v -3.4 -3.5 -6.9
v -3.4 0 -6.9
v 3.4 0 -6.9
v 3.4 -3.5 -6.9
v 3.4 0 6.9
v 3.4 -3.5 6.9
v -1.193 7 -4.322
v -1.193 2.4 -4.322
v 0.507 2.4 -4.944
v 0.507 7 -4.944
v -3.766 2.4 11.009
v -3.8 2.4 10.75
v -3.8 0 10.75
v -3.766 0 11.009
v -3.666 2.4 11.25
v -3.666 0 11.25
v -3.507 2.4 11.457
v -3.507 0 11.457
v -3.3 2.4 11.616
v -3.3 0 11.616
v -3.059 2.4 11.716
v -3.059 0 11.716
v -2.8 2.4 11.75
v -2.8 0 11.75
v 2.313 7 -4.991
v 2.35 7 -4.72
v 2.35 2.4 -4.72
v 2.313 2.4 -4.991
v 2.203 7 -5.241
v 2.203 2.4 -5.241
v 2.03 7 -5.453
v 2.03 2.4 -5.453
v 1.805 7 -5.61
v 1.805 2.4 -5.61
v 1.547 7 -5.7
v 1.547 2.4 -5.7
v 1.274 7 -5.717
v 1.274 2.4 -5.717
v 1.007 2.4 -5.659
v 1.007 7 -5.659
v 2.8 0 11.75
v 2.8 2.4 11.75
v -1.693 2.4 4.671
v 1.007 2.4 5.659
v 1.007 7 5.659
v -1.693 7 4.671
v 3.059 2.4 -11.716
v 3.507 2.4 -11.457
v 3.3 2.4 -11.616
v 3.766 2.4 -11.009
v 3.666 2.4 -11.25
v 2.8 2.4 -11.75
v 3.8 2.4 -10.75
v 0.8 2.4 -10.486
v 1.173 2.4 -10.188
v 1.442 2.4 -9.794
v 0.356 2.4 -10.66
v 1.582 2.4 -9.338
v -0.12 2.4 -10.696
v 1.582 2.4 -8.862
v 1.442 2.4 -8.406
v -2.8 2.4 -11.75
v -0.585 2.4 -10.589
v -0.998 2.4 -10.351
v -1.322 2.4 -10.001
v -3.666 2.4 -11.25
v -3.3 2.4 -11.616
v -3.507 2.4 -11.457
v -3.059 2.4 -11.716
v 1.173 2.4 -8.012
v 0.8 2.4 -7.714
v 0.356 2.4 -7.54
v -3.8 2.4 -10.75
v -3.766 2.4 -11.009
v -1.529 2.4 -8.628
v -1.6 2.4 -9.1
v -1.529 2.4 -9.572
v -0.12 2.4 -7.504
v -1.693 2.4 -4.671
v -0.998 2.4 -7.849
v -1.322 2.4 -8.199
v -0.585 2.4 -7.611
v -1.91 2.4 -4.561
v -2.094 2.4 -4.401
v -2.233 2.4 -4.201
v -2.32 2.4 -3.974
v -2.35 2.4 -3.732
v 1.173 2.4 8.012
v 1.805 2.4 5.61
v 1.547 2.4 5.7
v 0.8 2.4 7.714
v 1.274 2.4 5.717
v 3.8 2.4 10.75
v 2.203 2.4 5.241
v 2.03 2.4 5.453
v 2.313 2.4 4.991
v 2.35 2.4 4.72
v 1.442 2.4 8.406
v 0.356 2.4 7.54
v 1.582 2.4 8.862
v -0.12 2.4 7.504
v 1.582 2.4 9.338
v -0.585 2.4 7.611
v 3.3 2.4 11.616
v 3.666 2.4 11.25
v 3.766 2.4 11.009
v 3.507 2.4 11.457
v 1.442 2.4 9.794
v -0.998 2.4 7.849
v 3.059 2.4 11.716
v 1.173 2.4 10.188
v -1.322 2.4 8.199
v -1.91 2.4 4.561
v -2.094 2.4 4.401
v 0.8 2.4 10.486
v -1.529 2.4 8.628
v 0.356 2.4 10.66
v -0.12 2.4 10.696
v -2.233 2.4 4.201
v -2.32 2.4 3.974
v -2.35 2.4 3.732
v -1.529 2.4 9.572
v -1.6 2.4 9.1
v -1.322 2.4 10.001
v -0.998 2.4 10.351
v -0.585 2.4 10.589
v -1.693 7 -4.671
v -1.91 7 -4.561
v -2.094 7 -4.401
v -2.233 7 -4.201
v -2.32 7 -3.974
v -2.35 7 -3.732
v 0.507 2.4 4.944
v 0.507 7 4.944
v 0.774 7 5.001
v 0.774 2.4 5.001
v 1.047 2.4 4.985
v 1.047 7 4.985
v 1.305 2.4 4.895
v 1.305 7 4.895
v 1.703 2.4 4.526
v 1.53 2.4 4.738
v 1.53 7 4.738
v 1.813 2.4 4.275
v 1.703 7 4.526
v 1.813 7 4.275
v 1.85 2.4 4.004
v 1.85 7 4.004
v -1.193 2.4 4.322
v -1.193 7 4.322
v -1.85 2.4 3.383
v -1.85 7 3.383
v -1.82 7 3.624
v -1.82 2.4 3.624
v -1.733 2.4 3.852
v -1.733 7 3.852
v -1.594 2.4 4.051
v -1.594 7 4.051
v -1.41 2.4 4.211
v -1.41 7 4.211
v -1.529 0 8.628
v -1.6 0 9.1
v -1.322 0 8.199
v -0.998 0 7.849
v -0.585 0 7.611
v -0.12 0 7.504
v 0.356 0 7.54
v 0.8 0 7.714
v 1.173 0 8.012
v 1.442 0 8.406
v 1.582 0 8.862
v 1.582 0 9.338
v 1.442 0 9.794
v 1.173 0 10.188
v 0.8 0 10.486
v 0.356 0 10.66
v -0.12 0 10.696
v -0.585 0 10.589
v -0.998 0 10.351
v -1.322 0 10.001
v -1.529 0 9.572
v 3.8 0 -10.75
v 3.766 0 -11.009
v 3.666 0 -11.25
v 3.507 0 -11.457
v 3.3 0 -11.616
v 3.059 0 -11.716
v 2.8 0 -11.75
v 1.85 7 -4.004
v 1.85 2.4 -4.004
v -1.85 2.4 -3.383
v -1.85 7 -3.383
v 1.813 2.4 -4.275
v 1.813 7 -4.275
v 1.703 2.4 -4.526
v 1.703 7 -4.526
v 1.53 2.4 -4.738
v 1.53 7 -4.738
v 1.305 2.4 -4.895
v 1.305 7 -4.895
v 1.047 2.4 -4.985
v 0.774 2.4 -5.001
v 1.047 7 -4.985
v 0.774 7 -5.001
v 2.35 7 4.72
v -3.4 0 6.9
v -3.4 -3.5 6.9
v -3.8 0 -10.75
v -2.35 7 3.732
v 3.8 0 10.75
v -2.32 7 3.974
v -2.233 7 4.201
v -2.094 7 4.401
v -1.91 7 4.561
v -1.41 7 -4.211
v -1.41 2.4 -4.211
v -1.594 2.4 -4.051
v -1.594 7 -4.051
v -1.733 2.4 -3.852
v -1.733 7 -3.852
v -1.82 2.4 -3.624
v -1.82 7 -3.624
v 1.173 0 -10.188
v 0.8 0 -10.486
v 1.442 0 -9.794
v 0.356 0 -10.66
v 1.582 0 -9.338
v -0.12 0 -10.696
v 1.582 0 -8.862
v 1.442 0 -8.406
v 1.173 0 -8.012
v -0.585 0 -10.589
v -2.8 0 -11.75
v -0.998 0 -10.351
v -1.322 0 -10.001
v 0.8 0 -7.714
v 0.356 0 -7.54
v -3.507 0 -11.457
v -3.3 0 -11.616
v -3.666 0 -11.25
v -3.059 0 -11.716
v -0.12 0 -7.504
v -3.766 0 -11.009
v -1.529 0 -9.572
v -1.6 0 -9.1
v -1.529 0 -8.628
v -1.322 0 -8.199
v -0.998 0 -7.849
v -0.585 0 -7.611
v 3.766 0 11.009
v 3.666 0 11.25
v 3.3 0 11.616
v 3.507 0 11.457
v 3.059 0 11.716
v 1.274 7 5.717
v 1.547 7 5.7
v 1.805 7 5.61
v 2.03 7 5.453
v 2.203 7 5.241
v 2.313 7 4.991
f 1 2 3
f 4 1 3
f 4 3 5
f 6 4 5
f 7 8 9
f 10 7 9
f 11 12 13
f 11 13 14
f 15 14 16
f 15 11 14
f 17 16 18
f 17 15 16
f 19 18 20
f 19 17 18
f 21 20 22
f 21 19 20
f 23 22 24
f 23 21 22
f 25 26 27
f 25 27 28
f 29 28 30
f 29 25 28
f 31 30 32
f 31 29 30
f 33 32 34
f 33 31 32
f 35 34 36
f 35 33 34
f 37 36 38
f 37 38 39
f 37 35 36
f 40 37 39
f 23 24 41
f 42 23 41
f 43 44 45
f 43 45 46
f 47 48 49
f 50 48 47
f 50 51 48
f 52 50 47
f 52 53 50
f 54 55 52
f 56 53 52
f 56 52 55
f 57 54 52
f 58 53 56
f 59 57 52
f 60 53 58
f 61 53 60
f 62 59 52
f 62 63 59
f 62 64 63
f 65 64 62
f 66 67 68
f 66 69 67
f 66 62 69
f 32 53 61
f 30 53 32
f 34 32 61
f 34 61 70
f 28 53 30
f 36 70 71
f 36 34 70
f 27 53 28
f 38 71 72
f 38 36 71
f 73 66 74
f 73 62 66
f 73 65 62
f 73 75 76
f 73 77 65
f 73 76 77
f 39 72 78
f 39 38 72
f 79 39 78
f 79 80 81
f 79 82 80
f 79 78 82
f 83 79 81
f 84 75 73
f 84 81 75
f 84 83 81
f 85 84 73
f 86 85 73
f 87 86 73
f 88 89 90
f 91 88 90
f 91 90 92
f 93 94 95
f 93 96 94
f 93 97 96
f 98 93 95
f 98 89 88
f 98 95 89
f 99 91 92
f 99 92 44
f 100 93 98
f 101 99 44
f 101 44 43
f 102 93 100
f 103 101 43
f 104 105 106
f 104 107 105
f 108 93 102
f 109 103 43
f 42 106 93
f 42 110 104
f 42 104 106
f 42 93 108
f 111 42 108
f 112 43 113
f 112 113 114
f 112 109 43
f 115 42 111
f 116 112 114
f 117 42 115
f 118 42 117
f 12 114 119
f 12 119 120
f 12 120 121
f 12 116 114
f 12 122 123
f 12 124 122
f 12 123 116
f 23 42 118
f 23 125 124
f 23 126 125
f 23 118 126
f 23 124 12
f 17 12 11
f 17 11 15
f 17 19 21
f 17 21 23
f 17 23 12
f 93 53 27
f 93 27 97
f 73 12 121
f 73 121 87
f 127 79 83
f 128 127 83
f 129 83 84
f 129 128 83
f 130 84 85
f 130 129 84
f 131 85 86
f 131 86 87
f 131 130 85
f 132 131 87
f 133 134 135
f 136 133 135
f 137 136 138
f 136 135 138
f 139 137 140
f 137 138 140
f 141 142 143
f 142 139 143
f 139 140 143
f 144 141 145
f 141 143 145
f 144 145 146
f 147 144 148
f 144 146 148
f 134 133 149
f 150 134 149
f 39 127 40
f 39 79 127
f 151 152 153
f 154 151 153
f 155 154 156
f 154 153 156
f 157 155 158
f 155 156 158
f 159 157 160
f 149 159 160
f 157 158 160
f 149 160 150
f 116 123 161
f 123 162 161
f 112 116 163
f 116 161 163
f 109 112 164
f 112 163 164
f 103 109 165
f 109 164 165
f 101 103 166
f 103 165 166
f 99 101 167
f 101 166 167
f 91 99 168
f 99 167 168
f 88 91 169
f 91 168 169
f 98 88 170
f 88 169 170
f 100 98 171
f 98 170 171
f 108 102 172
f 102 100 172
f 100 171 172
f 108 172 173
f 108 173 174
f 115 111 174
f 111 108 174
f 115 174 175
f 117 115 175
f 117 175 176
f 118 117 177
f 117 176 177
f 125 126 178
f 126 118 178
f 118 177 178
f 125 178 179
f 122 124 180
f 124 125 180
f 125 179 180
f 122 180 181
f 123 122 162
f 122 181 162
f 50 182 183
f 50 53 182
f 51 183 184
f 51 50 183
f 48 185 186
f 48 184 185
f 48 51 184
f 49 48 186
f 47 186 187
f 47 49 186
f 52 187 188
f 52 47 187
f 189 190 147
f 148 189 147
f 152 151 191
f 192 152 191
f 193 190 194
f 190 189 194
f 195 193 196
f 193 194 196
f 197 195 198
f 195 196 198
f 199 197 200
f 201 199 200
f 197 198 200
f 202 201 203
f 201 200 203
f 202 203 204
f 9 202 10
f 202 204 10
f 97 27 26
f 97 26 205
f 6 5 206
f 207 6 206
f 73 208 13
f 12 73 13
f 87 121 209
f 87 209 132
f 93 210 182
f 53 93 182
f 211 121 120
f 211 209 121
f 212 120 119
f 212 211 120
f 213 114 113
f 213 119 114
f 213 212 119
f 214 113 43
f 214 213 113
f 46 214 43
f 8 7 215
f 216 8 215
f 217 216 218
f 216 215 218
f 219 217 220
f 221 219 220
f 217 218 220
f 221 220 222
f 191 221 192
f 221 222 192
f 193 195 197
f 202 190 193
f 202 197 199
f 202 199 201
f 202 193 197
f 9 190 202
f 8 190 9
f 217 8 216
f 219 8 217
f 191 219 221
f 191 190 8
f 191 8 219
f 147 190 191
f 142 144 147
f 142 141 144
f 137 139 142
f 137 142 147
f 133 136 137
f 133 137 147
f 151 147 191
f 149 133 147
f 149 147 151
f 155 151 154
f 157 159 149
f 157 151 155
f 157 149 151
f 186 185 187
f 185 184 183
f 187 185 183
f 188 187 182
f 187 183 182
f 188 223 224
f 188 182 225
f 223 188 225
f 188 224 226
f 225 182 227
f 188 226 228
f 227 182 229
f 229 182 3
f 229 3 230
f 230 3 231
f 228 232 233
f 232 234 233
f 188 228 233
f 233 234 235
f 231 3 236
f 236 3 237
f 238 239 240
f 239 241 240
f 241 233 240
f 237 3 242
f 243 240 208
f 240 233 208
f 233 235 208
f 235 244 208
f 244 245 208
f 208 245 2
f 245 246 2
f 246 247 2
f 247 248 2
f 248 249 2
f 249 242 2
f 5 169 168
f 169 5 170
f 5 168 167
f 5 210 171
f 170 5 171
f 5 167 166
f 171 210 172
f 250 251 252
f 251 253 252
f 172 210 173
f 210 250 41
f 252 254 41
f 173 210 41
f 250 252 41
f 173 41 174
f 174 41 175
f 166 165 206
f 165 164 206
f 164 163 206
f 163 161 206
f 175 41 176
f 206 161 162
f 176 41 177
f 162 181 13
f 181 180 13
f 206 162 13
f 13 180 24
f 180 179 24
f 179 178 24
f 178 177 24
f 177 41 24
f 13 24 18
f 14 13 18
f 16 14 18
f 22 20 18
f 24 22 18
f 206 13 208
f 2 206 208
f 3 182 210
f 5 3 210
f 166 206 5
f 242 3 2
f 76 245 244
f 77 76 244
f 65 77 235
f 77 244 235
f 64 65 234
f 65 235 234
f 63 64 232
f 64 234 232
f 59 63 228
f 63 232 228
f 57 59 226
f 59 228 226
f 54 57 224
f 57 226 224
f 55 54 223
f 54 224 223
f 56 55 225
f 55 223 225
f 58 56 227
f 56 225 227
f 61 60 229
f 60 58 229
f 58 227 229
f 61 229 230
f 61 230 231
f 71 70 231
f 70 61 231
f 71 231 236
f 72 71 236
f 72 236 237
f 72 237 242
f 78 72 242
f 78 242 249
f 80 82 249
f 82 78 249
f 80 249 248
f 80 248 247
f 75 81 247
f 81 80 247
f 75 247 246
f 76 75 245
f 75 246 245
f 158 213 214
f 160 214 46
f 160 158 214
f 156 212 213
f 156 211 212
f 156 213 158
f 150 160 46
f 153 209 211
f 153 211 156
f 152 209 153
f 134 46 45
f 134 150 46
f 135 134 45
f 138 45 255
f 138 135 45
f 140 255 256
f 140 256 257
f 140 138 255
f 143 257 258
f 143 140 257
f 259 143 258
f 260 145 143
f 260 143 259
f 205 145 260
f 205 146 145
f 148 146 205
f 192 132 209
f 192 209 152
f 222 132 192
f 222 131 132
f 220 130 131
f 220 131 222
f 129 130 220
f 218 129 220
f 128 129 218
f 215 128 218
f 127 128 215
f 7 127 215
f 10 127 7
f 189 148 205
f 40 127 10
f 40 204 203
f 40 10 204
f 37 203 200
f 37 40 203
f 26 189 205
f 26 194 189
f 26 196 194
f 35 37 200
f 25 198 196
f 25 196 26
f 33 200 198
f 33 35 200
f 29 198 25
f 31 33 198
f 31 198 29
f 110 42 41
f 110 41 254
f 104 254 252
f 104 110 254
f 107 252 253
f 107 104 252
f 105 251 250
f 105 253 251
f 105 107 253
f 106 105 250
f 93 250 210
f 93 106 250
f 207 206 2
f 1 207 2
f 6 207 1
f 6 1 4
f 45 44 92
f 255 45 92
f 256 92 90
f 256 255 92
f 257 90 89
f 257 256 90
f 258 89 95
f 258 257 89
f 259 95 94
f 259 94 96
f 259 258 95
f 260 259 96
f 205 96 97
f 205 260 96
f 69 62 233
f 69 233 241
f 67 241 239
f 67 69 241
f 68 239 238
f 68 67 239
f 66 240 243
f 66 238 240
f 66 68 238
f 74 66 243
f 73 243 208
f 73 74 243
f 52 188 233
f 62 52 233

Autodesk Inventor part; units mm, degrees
ref_plane "YZ Plane" through (0, 0, 0) normal (1, 0, 0) x (0, 1, 0)
ref_plane "XZ Plane" through (0, 0, 0) normal (0, 1, 0) x (-1, 0, 0)
ref_plane "XY Plane" through (0, 0, 0) normal (0, 0, 1) x (1, 0, 0)
sketch "Sketch1" plane through (0, 0, 0) normal (0, 1, 0) x (-1, 0, 0)
  line L0 (3.8, 11.75) -> (-3.8, 11.75)
  line L1 (-3.8, 11.75) -> (-3.8, -11.75)
  line L2 (-3.8, -11.75) -> (3.8, -11.75)
  line L3 (3.8, -11.75) -> (3.8, 11.75)
  circle A0 centre (0, 9.1) radius 1.6
  circle A1 centre (0, -9.1) radius 1.6
  point P0 (0, 0)
  dimension "d0" = 23.5
  dimension "d1" = 7.6
  dimension "d2" = 11.75
  dimension "d3" = 3.8
  dimension "d4" = 3.2
  dimension "d5" = 3.2
  dimension "d6" = 18.2
  dimension "d7" = 9.1
extrude "Extrusion1" add sketch "Sketch1" along normal blind 2.4
fillet "Fillet1" radius 1 4 edges at (3.8, 1.2, 11.75) (-3.8, 1.2, 11.75) (3.8, 1.2, -11.75) (-3.8, 1.2, -11.75)
sketch "Sketch2" plane through (0, 2.4, 0) normal (0, 1, 0) x (1, 0, 0)
  line L0 (-2.35, -4.4313) -> (-2.35, 4.4313)
  line L1 (-2.35, 4.4313) -> (2.35, 6.15)
  line L2 (2.35, 6.15) -> (2.35, -6.15)
  line L3 (2.35, -6.15) -> (-2.35, -4.4313)
  line L4 (1.85, -5.4348) -> (-1.85, -4.0818)
  line L5 (-1.85, -4.0818) -> (-1.85, 4.0818)
  line L6 (-1.85, 4.0818) -> (1.85, 5.4348)
  line L7 (1.85, 5.4348) -> (1.85, -5.4348)
  point P0 (0, 0)
  dimension "d11" = 69.914
  dimension "d13" = 12.3
  dimension "d14" = 4.7
  dimension "d15" = 2.35
  dimension "d17" = 0.5
  dimension "d18" = 0.5
  dimension "d19" = 0.5
  dimension "d20" = 0.5
  dimension "d21" = 6.15
  dimension "d22" = 69.914
  dimension "d23" = 69.914
extrude "Extrusion2" add sketch "Sketch2" along normal blind 4.6
fillet "Fillet2" radius 1 8 edges at (-2.35, 4.7, -4.4313) (-2.35, 4.7, 4.4313) (2.35, 4.7, 6.15) (2.35, 4.7, -6.15) (-1.85, 4.7, -4.0818) (-1.85, 4.7, 4.0818) (1.85, 4.7, -5.4348) (1.85, 4.7, 5.4348)
sketch "Sketch3" plane through (0, 0, 0) normal (0, -1, 0) x (1, 0, 0)
  line L0 (3.4, 6.9) -> (-3.4, 6.9)
  line L1 (-3.4, 6.9) -> (-3.4, -6.9)
  line L2 (-3.4, -6.9) -> (3.4, -6.9)
  line L3 (3.4, -6.9) -> (3.4, 6.9)
  point P0 (0, 0)
  dimension "d27" = 13.8
  dimension "d28" = 6.8
  dimension "d29" = 6.9
  dimension "d30" = 3.4
extrude "Extrusion3" add sketch "Sketch3" along normal blind 3.5
equation "\"d2\" = 0.5 * d0"
equation "\"d3\" = 0.5 * d1"
equation "\"d5\" = d4"
equation "\"d7\" = 0.5 * d6"
equation "\"d15\" = 0.5 * d14"
equation "\"d21\" = 0.5 * d13"
equation "\"d22\" = d11"
equation "\"d29\" = 0.5 * d27"
equation "\"d30\" = 0.5 * d28"
properties part number "15pin male connector"
